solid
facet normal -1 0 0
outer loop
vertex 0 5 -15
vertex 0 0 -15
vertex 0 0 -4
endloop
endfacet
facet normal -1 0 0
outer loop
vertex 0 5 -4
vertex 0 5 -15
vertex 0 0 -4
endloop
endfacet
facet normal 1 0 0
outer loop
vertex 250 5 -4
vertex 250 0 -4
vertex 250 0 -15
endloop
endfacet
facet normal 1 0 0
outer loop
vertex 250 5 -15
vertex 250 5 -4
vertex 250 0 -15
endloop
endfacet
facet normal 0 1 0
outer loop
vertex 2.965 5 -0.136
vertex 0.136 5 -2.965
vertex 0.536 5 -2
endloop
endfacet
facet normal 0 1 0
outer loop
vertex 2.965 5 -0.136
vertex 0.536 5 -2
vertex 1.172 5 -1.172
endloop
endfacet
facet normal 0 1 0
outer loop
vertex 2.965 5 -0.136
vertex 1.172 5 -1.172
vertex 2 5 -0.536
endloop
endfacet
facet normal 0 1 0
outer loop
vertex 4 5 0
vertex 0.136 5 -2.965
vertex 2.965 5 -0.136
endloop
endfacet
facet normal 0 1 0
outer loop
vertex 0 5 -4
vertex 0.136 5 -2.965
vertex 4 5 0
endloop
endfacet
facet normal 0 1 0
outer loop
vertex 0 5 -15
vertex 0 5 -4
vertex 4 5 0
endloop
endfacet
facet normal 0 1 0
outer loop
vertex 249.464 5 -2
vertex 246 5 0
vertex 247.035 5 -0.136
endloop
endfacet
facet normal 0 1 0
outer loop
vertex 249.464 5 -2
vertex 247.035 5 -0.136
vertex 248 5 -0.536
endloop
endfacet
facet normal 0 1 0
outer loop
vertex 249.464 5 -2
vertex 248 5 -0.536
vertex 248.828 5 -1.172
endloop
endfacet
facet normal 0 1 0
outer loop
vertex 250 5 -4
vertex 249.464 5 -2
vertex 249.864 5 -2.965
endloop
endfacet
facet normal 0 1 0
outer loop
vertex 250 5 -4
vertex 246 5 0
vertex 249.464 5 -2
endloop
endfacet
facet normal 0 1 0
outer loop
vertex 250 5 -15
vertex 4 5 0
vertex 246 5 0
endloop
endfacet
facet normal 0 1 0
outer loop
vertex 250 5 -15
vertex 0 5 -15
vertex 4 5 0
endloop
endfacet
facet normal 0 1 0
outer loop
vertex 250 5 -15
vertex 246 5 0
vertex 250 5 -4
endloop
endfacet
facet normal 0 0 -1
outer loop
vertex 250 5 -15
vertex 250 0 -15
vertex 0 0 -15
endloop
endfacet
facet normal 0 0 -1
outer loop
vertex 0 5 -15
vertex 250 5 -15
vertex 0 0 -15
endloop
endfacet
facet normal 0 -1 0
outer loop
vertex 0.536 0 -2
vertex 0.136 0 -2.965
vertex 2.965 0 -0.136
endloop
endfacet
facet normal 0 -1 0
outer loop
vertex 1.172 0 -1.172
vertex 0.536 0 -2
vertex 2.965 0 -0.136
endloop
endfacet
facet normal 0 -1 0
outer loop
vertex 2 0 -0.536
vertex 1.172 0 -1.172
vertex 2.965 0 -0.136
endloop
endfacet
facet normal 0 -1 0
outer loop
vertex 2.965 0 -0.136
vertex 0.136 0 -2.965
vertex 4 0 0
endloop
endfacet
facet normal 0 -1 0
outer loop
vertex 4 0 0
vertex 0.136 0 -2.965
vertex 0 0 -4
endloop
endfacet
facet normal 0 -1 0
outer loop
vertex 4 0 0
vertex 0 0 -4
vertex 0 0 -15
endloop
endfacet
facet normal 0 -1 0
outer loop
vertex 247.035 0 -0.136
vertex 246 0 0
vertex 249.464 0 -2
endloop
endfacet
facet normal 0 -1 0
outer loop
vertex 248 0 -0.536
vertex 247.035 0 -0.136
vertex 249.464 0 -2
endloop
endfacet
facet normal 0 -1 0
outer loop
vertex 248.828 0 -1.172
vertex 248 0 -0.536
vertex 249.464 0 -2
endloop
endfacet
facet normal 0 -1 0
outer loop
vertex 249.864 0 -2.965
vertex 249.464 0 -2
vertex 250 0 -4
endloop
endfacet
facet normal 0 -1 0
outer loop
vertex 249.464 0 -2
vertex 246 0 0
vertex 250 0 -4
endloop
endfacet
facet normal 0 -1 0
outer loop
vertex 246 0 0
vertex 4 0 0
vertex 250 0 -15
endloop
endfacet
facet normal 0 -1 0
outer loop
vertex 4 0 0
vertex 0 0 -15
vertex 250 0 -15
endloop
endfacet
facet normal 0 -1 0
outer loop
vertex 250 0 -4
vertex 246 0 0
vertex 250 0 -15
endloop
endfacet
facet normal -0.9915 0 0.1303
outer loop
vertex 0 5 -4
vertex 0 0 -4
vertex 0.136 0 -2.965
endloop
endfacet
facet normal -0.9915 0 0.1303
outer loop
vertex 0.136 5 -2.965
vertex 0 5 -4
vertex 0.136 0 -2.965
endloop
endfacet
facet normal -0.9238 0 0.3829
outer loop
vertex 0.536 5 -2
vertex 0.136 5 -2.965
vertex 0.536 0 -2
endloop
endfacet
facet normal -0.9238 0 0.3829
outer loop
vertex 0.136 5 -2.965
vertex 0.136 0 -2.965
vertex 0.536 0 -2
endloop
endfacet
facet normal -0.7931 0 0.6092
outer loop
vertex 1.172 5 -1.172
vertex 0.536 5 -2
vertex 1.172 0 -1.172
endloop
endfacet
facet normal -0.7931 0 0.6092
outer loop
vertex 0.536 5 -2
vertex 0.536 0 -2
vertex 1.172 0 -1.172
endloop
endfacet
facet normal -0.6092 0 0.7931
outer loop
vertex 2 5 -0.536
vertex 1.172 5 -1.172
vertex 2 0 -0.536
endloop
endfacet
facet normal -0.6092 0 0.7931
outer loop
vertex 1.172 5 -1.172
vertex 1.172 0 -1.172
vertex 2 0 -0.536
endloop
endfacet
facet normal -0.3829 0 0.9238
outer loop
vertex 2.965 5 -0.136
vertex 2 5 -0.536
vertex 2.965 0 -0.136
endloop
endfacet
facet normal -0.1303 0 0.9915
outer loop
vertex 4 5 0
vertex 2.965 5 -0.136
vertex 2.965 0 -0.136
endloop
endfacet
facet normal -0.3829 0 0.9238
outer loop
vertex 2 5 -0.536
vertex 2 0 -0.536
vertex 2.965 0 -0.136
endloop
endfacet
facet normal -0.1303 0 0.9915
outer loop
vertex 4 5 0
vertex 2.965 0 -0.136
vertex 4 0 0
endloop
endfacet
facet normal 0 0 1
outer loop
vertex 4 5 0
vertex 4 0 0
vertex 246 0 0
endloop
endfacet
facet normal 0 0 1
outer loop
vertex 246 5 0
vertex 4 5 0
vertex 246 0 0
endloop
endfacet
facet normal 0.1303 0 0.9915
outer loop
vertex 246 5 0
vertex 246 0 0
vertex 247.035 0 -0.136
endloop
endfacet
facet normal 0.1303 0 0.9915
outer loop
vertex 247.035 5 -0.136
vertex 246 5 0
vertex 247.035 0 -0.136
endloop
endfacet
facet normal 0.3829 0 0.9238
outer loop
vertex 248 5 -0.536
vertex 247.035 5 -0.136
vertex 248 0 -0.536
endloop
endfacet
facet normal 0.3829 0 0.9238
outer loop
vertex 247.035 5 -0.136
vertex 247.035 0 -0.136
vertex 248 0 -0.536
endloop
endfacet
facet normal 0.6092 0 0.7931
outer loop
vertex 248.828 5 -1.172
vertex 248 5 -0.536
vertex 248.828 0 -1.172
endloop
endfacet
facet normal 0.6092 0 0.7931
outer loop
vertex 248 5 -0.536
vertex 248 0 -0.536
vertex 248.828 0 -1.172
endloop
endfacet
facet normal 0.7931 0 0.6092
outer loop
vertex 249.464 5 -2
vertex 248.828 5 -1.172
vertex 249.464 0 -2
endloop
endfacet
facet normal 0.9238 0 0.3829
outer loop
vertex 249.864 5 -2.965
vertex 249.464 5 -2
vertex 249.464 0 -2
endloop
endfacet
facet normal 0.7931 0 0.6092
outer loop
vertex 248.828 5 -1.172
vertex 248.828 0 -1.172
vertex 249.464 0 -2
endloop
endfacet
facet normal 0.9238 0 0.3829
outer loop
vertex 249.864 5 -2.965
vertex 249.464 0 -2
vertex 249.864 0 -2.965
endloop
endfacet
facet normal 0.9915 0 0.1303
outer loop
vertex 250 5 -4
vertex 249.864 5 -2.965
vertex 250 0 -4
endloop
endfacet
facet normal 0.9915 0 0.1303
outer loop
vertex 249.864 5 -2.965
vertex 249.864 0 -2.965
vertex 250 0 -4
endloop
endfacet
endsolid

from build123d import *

# Parameters (mm, degrees)
SALIENTE_EXTRUIR1_DEPTH = 5


with BuildPart() as part:
    # Croquis1 → Saliente-Extruir1 (new body)
    with BuildSketch(Plane(origin=(0, 0, 0), x_dir=(1, 0, 0), z_dir=(0, 1, 0))):
        with BuildLine():
            Line((4, 0), (246, 0))
            ThreePointArc((246, 0), (248.828427125, 1.171572875), (250, 4))
            Line((250, 4), (250, 15))
            Line((250, 15), (0, 15))
            Line((0, 15), (0, 4))
            ThreePointArc((0, 4), (1.171572875, 1.171572875), (4, 0))
        make_face()
    extrude(amount=SALIENTE_EXTRUIR1_DEPTH)


solid = part.part
